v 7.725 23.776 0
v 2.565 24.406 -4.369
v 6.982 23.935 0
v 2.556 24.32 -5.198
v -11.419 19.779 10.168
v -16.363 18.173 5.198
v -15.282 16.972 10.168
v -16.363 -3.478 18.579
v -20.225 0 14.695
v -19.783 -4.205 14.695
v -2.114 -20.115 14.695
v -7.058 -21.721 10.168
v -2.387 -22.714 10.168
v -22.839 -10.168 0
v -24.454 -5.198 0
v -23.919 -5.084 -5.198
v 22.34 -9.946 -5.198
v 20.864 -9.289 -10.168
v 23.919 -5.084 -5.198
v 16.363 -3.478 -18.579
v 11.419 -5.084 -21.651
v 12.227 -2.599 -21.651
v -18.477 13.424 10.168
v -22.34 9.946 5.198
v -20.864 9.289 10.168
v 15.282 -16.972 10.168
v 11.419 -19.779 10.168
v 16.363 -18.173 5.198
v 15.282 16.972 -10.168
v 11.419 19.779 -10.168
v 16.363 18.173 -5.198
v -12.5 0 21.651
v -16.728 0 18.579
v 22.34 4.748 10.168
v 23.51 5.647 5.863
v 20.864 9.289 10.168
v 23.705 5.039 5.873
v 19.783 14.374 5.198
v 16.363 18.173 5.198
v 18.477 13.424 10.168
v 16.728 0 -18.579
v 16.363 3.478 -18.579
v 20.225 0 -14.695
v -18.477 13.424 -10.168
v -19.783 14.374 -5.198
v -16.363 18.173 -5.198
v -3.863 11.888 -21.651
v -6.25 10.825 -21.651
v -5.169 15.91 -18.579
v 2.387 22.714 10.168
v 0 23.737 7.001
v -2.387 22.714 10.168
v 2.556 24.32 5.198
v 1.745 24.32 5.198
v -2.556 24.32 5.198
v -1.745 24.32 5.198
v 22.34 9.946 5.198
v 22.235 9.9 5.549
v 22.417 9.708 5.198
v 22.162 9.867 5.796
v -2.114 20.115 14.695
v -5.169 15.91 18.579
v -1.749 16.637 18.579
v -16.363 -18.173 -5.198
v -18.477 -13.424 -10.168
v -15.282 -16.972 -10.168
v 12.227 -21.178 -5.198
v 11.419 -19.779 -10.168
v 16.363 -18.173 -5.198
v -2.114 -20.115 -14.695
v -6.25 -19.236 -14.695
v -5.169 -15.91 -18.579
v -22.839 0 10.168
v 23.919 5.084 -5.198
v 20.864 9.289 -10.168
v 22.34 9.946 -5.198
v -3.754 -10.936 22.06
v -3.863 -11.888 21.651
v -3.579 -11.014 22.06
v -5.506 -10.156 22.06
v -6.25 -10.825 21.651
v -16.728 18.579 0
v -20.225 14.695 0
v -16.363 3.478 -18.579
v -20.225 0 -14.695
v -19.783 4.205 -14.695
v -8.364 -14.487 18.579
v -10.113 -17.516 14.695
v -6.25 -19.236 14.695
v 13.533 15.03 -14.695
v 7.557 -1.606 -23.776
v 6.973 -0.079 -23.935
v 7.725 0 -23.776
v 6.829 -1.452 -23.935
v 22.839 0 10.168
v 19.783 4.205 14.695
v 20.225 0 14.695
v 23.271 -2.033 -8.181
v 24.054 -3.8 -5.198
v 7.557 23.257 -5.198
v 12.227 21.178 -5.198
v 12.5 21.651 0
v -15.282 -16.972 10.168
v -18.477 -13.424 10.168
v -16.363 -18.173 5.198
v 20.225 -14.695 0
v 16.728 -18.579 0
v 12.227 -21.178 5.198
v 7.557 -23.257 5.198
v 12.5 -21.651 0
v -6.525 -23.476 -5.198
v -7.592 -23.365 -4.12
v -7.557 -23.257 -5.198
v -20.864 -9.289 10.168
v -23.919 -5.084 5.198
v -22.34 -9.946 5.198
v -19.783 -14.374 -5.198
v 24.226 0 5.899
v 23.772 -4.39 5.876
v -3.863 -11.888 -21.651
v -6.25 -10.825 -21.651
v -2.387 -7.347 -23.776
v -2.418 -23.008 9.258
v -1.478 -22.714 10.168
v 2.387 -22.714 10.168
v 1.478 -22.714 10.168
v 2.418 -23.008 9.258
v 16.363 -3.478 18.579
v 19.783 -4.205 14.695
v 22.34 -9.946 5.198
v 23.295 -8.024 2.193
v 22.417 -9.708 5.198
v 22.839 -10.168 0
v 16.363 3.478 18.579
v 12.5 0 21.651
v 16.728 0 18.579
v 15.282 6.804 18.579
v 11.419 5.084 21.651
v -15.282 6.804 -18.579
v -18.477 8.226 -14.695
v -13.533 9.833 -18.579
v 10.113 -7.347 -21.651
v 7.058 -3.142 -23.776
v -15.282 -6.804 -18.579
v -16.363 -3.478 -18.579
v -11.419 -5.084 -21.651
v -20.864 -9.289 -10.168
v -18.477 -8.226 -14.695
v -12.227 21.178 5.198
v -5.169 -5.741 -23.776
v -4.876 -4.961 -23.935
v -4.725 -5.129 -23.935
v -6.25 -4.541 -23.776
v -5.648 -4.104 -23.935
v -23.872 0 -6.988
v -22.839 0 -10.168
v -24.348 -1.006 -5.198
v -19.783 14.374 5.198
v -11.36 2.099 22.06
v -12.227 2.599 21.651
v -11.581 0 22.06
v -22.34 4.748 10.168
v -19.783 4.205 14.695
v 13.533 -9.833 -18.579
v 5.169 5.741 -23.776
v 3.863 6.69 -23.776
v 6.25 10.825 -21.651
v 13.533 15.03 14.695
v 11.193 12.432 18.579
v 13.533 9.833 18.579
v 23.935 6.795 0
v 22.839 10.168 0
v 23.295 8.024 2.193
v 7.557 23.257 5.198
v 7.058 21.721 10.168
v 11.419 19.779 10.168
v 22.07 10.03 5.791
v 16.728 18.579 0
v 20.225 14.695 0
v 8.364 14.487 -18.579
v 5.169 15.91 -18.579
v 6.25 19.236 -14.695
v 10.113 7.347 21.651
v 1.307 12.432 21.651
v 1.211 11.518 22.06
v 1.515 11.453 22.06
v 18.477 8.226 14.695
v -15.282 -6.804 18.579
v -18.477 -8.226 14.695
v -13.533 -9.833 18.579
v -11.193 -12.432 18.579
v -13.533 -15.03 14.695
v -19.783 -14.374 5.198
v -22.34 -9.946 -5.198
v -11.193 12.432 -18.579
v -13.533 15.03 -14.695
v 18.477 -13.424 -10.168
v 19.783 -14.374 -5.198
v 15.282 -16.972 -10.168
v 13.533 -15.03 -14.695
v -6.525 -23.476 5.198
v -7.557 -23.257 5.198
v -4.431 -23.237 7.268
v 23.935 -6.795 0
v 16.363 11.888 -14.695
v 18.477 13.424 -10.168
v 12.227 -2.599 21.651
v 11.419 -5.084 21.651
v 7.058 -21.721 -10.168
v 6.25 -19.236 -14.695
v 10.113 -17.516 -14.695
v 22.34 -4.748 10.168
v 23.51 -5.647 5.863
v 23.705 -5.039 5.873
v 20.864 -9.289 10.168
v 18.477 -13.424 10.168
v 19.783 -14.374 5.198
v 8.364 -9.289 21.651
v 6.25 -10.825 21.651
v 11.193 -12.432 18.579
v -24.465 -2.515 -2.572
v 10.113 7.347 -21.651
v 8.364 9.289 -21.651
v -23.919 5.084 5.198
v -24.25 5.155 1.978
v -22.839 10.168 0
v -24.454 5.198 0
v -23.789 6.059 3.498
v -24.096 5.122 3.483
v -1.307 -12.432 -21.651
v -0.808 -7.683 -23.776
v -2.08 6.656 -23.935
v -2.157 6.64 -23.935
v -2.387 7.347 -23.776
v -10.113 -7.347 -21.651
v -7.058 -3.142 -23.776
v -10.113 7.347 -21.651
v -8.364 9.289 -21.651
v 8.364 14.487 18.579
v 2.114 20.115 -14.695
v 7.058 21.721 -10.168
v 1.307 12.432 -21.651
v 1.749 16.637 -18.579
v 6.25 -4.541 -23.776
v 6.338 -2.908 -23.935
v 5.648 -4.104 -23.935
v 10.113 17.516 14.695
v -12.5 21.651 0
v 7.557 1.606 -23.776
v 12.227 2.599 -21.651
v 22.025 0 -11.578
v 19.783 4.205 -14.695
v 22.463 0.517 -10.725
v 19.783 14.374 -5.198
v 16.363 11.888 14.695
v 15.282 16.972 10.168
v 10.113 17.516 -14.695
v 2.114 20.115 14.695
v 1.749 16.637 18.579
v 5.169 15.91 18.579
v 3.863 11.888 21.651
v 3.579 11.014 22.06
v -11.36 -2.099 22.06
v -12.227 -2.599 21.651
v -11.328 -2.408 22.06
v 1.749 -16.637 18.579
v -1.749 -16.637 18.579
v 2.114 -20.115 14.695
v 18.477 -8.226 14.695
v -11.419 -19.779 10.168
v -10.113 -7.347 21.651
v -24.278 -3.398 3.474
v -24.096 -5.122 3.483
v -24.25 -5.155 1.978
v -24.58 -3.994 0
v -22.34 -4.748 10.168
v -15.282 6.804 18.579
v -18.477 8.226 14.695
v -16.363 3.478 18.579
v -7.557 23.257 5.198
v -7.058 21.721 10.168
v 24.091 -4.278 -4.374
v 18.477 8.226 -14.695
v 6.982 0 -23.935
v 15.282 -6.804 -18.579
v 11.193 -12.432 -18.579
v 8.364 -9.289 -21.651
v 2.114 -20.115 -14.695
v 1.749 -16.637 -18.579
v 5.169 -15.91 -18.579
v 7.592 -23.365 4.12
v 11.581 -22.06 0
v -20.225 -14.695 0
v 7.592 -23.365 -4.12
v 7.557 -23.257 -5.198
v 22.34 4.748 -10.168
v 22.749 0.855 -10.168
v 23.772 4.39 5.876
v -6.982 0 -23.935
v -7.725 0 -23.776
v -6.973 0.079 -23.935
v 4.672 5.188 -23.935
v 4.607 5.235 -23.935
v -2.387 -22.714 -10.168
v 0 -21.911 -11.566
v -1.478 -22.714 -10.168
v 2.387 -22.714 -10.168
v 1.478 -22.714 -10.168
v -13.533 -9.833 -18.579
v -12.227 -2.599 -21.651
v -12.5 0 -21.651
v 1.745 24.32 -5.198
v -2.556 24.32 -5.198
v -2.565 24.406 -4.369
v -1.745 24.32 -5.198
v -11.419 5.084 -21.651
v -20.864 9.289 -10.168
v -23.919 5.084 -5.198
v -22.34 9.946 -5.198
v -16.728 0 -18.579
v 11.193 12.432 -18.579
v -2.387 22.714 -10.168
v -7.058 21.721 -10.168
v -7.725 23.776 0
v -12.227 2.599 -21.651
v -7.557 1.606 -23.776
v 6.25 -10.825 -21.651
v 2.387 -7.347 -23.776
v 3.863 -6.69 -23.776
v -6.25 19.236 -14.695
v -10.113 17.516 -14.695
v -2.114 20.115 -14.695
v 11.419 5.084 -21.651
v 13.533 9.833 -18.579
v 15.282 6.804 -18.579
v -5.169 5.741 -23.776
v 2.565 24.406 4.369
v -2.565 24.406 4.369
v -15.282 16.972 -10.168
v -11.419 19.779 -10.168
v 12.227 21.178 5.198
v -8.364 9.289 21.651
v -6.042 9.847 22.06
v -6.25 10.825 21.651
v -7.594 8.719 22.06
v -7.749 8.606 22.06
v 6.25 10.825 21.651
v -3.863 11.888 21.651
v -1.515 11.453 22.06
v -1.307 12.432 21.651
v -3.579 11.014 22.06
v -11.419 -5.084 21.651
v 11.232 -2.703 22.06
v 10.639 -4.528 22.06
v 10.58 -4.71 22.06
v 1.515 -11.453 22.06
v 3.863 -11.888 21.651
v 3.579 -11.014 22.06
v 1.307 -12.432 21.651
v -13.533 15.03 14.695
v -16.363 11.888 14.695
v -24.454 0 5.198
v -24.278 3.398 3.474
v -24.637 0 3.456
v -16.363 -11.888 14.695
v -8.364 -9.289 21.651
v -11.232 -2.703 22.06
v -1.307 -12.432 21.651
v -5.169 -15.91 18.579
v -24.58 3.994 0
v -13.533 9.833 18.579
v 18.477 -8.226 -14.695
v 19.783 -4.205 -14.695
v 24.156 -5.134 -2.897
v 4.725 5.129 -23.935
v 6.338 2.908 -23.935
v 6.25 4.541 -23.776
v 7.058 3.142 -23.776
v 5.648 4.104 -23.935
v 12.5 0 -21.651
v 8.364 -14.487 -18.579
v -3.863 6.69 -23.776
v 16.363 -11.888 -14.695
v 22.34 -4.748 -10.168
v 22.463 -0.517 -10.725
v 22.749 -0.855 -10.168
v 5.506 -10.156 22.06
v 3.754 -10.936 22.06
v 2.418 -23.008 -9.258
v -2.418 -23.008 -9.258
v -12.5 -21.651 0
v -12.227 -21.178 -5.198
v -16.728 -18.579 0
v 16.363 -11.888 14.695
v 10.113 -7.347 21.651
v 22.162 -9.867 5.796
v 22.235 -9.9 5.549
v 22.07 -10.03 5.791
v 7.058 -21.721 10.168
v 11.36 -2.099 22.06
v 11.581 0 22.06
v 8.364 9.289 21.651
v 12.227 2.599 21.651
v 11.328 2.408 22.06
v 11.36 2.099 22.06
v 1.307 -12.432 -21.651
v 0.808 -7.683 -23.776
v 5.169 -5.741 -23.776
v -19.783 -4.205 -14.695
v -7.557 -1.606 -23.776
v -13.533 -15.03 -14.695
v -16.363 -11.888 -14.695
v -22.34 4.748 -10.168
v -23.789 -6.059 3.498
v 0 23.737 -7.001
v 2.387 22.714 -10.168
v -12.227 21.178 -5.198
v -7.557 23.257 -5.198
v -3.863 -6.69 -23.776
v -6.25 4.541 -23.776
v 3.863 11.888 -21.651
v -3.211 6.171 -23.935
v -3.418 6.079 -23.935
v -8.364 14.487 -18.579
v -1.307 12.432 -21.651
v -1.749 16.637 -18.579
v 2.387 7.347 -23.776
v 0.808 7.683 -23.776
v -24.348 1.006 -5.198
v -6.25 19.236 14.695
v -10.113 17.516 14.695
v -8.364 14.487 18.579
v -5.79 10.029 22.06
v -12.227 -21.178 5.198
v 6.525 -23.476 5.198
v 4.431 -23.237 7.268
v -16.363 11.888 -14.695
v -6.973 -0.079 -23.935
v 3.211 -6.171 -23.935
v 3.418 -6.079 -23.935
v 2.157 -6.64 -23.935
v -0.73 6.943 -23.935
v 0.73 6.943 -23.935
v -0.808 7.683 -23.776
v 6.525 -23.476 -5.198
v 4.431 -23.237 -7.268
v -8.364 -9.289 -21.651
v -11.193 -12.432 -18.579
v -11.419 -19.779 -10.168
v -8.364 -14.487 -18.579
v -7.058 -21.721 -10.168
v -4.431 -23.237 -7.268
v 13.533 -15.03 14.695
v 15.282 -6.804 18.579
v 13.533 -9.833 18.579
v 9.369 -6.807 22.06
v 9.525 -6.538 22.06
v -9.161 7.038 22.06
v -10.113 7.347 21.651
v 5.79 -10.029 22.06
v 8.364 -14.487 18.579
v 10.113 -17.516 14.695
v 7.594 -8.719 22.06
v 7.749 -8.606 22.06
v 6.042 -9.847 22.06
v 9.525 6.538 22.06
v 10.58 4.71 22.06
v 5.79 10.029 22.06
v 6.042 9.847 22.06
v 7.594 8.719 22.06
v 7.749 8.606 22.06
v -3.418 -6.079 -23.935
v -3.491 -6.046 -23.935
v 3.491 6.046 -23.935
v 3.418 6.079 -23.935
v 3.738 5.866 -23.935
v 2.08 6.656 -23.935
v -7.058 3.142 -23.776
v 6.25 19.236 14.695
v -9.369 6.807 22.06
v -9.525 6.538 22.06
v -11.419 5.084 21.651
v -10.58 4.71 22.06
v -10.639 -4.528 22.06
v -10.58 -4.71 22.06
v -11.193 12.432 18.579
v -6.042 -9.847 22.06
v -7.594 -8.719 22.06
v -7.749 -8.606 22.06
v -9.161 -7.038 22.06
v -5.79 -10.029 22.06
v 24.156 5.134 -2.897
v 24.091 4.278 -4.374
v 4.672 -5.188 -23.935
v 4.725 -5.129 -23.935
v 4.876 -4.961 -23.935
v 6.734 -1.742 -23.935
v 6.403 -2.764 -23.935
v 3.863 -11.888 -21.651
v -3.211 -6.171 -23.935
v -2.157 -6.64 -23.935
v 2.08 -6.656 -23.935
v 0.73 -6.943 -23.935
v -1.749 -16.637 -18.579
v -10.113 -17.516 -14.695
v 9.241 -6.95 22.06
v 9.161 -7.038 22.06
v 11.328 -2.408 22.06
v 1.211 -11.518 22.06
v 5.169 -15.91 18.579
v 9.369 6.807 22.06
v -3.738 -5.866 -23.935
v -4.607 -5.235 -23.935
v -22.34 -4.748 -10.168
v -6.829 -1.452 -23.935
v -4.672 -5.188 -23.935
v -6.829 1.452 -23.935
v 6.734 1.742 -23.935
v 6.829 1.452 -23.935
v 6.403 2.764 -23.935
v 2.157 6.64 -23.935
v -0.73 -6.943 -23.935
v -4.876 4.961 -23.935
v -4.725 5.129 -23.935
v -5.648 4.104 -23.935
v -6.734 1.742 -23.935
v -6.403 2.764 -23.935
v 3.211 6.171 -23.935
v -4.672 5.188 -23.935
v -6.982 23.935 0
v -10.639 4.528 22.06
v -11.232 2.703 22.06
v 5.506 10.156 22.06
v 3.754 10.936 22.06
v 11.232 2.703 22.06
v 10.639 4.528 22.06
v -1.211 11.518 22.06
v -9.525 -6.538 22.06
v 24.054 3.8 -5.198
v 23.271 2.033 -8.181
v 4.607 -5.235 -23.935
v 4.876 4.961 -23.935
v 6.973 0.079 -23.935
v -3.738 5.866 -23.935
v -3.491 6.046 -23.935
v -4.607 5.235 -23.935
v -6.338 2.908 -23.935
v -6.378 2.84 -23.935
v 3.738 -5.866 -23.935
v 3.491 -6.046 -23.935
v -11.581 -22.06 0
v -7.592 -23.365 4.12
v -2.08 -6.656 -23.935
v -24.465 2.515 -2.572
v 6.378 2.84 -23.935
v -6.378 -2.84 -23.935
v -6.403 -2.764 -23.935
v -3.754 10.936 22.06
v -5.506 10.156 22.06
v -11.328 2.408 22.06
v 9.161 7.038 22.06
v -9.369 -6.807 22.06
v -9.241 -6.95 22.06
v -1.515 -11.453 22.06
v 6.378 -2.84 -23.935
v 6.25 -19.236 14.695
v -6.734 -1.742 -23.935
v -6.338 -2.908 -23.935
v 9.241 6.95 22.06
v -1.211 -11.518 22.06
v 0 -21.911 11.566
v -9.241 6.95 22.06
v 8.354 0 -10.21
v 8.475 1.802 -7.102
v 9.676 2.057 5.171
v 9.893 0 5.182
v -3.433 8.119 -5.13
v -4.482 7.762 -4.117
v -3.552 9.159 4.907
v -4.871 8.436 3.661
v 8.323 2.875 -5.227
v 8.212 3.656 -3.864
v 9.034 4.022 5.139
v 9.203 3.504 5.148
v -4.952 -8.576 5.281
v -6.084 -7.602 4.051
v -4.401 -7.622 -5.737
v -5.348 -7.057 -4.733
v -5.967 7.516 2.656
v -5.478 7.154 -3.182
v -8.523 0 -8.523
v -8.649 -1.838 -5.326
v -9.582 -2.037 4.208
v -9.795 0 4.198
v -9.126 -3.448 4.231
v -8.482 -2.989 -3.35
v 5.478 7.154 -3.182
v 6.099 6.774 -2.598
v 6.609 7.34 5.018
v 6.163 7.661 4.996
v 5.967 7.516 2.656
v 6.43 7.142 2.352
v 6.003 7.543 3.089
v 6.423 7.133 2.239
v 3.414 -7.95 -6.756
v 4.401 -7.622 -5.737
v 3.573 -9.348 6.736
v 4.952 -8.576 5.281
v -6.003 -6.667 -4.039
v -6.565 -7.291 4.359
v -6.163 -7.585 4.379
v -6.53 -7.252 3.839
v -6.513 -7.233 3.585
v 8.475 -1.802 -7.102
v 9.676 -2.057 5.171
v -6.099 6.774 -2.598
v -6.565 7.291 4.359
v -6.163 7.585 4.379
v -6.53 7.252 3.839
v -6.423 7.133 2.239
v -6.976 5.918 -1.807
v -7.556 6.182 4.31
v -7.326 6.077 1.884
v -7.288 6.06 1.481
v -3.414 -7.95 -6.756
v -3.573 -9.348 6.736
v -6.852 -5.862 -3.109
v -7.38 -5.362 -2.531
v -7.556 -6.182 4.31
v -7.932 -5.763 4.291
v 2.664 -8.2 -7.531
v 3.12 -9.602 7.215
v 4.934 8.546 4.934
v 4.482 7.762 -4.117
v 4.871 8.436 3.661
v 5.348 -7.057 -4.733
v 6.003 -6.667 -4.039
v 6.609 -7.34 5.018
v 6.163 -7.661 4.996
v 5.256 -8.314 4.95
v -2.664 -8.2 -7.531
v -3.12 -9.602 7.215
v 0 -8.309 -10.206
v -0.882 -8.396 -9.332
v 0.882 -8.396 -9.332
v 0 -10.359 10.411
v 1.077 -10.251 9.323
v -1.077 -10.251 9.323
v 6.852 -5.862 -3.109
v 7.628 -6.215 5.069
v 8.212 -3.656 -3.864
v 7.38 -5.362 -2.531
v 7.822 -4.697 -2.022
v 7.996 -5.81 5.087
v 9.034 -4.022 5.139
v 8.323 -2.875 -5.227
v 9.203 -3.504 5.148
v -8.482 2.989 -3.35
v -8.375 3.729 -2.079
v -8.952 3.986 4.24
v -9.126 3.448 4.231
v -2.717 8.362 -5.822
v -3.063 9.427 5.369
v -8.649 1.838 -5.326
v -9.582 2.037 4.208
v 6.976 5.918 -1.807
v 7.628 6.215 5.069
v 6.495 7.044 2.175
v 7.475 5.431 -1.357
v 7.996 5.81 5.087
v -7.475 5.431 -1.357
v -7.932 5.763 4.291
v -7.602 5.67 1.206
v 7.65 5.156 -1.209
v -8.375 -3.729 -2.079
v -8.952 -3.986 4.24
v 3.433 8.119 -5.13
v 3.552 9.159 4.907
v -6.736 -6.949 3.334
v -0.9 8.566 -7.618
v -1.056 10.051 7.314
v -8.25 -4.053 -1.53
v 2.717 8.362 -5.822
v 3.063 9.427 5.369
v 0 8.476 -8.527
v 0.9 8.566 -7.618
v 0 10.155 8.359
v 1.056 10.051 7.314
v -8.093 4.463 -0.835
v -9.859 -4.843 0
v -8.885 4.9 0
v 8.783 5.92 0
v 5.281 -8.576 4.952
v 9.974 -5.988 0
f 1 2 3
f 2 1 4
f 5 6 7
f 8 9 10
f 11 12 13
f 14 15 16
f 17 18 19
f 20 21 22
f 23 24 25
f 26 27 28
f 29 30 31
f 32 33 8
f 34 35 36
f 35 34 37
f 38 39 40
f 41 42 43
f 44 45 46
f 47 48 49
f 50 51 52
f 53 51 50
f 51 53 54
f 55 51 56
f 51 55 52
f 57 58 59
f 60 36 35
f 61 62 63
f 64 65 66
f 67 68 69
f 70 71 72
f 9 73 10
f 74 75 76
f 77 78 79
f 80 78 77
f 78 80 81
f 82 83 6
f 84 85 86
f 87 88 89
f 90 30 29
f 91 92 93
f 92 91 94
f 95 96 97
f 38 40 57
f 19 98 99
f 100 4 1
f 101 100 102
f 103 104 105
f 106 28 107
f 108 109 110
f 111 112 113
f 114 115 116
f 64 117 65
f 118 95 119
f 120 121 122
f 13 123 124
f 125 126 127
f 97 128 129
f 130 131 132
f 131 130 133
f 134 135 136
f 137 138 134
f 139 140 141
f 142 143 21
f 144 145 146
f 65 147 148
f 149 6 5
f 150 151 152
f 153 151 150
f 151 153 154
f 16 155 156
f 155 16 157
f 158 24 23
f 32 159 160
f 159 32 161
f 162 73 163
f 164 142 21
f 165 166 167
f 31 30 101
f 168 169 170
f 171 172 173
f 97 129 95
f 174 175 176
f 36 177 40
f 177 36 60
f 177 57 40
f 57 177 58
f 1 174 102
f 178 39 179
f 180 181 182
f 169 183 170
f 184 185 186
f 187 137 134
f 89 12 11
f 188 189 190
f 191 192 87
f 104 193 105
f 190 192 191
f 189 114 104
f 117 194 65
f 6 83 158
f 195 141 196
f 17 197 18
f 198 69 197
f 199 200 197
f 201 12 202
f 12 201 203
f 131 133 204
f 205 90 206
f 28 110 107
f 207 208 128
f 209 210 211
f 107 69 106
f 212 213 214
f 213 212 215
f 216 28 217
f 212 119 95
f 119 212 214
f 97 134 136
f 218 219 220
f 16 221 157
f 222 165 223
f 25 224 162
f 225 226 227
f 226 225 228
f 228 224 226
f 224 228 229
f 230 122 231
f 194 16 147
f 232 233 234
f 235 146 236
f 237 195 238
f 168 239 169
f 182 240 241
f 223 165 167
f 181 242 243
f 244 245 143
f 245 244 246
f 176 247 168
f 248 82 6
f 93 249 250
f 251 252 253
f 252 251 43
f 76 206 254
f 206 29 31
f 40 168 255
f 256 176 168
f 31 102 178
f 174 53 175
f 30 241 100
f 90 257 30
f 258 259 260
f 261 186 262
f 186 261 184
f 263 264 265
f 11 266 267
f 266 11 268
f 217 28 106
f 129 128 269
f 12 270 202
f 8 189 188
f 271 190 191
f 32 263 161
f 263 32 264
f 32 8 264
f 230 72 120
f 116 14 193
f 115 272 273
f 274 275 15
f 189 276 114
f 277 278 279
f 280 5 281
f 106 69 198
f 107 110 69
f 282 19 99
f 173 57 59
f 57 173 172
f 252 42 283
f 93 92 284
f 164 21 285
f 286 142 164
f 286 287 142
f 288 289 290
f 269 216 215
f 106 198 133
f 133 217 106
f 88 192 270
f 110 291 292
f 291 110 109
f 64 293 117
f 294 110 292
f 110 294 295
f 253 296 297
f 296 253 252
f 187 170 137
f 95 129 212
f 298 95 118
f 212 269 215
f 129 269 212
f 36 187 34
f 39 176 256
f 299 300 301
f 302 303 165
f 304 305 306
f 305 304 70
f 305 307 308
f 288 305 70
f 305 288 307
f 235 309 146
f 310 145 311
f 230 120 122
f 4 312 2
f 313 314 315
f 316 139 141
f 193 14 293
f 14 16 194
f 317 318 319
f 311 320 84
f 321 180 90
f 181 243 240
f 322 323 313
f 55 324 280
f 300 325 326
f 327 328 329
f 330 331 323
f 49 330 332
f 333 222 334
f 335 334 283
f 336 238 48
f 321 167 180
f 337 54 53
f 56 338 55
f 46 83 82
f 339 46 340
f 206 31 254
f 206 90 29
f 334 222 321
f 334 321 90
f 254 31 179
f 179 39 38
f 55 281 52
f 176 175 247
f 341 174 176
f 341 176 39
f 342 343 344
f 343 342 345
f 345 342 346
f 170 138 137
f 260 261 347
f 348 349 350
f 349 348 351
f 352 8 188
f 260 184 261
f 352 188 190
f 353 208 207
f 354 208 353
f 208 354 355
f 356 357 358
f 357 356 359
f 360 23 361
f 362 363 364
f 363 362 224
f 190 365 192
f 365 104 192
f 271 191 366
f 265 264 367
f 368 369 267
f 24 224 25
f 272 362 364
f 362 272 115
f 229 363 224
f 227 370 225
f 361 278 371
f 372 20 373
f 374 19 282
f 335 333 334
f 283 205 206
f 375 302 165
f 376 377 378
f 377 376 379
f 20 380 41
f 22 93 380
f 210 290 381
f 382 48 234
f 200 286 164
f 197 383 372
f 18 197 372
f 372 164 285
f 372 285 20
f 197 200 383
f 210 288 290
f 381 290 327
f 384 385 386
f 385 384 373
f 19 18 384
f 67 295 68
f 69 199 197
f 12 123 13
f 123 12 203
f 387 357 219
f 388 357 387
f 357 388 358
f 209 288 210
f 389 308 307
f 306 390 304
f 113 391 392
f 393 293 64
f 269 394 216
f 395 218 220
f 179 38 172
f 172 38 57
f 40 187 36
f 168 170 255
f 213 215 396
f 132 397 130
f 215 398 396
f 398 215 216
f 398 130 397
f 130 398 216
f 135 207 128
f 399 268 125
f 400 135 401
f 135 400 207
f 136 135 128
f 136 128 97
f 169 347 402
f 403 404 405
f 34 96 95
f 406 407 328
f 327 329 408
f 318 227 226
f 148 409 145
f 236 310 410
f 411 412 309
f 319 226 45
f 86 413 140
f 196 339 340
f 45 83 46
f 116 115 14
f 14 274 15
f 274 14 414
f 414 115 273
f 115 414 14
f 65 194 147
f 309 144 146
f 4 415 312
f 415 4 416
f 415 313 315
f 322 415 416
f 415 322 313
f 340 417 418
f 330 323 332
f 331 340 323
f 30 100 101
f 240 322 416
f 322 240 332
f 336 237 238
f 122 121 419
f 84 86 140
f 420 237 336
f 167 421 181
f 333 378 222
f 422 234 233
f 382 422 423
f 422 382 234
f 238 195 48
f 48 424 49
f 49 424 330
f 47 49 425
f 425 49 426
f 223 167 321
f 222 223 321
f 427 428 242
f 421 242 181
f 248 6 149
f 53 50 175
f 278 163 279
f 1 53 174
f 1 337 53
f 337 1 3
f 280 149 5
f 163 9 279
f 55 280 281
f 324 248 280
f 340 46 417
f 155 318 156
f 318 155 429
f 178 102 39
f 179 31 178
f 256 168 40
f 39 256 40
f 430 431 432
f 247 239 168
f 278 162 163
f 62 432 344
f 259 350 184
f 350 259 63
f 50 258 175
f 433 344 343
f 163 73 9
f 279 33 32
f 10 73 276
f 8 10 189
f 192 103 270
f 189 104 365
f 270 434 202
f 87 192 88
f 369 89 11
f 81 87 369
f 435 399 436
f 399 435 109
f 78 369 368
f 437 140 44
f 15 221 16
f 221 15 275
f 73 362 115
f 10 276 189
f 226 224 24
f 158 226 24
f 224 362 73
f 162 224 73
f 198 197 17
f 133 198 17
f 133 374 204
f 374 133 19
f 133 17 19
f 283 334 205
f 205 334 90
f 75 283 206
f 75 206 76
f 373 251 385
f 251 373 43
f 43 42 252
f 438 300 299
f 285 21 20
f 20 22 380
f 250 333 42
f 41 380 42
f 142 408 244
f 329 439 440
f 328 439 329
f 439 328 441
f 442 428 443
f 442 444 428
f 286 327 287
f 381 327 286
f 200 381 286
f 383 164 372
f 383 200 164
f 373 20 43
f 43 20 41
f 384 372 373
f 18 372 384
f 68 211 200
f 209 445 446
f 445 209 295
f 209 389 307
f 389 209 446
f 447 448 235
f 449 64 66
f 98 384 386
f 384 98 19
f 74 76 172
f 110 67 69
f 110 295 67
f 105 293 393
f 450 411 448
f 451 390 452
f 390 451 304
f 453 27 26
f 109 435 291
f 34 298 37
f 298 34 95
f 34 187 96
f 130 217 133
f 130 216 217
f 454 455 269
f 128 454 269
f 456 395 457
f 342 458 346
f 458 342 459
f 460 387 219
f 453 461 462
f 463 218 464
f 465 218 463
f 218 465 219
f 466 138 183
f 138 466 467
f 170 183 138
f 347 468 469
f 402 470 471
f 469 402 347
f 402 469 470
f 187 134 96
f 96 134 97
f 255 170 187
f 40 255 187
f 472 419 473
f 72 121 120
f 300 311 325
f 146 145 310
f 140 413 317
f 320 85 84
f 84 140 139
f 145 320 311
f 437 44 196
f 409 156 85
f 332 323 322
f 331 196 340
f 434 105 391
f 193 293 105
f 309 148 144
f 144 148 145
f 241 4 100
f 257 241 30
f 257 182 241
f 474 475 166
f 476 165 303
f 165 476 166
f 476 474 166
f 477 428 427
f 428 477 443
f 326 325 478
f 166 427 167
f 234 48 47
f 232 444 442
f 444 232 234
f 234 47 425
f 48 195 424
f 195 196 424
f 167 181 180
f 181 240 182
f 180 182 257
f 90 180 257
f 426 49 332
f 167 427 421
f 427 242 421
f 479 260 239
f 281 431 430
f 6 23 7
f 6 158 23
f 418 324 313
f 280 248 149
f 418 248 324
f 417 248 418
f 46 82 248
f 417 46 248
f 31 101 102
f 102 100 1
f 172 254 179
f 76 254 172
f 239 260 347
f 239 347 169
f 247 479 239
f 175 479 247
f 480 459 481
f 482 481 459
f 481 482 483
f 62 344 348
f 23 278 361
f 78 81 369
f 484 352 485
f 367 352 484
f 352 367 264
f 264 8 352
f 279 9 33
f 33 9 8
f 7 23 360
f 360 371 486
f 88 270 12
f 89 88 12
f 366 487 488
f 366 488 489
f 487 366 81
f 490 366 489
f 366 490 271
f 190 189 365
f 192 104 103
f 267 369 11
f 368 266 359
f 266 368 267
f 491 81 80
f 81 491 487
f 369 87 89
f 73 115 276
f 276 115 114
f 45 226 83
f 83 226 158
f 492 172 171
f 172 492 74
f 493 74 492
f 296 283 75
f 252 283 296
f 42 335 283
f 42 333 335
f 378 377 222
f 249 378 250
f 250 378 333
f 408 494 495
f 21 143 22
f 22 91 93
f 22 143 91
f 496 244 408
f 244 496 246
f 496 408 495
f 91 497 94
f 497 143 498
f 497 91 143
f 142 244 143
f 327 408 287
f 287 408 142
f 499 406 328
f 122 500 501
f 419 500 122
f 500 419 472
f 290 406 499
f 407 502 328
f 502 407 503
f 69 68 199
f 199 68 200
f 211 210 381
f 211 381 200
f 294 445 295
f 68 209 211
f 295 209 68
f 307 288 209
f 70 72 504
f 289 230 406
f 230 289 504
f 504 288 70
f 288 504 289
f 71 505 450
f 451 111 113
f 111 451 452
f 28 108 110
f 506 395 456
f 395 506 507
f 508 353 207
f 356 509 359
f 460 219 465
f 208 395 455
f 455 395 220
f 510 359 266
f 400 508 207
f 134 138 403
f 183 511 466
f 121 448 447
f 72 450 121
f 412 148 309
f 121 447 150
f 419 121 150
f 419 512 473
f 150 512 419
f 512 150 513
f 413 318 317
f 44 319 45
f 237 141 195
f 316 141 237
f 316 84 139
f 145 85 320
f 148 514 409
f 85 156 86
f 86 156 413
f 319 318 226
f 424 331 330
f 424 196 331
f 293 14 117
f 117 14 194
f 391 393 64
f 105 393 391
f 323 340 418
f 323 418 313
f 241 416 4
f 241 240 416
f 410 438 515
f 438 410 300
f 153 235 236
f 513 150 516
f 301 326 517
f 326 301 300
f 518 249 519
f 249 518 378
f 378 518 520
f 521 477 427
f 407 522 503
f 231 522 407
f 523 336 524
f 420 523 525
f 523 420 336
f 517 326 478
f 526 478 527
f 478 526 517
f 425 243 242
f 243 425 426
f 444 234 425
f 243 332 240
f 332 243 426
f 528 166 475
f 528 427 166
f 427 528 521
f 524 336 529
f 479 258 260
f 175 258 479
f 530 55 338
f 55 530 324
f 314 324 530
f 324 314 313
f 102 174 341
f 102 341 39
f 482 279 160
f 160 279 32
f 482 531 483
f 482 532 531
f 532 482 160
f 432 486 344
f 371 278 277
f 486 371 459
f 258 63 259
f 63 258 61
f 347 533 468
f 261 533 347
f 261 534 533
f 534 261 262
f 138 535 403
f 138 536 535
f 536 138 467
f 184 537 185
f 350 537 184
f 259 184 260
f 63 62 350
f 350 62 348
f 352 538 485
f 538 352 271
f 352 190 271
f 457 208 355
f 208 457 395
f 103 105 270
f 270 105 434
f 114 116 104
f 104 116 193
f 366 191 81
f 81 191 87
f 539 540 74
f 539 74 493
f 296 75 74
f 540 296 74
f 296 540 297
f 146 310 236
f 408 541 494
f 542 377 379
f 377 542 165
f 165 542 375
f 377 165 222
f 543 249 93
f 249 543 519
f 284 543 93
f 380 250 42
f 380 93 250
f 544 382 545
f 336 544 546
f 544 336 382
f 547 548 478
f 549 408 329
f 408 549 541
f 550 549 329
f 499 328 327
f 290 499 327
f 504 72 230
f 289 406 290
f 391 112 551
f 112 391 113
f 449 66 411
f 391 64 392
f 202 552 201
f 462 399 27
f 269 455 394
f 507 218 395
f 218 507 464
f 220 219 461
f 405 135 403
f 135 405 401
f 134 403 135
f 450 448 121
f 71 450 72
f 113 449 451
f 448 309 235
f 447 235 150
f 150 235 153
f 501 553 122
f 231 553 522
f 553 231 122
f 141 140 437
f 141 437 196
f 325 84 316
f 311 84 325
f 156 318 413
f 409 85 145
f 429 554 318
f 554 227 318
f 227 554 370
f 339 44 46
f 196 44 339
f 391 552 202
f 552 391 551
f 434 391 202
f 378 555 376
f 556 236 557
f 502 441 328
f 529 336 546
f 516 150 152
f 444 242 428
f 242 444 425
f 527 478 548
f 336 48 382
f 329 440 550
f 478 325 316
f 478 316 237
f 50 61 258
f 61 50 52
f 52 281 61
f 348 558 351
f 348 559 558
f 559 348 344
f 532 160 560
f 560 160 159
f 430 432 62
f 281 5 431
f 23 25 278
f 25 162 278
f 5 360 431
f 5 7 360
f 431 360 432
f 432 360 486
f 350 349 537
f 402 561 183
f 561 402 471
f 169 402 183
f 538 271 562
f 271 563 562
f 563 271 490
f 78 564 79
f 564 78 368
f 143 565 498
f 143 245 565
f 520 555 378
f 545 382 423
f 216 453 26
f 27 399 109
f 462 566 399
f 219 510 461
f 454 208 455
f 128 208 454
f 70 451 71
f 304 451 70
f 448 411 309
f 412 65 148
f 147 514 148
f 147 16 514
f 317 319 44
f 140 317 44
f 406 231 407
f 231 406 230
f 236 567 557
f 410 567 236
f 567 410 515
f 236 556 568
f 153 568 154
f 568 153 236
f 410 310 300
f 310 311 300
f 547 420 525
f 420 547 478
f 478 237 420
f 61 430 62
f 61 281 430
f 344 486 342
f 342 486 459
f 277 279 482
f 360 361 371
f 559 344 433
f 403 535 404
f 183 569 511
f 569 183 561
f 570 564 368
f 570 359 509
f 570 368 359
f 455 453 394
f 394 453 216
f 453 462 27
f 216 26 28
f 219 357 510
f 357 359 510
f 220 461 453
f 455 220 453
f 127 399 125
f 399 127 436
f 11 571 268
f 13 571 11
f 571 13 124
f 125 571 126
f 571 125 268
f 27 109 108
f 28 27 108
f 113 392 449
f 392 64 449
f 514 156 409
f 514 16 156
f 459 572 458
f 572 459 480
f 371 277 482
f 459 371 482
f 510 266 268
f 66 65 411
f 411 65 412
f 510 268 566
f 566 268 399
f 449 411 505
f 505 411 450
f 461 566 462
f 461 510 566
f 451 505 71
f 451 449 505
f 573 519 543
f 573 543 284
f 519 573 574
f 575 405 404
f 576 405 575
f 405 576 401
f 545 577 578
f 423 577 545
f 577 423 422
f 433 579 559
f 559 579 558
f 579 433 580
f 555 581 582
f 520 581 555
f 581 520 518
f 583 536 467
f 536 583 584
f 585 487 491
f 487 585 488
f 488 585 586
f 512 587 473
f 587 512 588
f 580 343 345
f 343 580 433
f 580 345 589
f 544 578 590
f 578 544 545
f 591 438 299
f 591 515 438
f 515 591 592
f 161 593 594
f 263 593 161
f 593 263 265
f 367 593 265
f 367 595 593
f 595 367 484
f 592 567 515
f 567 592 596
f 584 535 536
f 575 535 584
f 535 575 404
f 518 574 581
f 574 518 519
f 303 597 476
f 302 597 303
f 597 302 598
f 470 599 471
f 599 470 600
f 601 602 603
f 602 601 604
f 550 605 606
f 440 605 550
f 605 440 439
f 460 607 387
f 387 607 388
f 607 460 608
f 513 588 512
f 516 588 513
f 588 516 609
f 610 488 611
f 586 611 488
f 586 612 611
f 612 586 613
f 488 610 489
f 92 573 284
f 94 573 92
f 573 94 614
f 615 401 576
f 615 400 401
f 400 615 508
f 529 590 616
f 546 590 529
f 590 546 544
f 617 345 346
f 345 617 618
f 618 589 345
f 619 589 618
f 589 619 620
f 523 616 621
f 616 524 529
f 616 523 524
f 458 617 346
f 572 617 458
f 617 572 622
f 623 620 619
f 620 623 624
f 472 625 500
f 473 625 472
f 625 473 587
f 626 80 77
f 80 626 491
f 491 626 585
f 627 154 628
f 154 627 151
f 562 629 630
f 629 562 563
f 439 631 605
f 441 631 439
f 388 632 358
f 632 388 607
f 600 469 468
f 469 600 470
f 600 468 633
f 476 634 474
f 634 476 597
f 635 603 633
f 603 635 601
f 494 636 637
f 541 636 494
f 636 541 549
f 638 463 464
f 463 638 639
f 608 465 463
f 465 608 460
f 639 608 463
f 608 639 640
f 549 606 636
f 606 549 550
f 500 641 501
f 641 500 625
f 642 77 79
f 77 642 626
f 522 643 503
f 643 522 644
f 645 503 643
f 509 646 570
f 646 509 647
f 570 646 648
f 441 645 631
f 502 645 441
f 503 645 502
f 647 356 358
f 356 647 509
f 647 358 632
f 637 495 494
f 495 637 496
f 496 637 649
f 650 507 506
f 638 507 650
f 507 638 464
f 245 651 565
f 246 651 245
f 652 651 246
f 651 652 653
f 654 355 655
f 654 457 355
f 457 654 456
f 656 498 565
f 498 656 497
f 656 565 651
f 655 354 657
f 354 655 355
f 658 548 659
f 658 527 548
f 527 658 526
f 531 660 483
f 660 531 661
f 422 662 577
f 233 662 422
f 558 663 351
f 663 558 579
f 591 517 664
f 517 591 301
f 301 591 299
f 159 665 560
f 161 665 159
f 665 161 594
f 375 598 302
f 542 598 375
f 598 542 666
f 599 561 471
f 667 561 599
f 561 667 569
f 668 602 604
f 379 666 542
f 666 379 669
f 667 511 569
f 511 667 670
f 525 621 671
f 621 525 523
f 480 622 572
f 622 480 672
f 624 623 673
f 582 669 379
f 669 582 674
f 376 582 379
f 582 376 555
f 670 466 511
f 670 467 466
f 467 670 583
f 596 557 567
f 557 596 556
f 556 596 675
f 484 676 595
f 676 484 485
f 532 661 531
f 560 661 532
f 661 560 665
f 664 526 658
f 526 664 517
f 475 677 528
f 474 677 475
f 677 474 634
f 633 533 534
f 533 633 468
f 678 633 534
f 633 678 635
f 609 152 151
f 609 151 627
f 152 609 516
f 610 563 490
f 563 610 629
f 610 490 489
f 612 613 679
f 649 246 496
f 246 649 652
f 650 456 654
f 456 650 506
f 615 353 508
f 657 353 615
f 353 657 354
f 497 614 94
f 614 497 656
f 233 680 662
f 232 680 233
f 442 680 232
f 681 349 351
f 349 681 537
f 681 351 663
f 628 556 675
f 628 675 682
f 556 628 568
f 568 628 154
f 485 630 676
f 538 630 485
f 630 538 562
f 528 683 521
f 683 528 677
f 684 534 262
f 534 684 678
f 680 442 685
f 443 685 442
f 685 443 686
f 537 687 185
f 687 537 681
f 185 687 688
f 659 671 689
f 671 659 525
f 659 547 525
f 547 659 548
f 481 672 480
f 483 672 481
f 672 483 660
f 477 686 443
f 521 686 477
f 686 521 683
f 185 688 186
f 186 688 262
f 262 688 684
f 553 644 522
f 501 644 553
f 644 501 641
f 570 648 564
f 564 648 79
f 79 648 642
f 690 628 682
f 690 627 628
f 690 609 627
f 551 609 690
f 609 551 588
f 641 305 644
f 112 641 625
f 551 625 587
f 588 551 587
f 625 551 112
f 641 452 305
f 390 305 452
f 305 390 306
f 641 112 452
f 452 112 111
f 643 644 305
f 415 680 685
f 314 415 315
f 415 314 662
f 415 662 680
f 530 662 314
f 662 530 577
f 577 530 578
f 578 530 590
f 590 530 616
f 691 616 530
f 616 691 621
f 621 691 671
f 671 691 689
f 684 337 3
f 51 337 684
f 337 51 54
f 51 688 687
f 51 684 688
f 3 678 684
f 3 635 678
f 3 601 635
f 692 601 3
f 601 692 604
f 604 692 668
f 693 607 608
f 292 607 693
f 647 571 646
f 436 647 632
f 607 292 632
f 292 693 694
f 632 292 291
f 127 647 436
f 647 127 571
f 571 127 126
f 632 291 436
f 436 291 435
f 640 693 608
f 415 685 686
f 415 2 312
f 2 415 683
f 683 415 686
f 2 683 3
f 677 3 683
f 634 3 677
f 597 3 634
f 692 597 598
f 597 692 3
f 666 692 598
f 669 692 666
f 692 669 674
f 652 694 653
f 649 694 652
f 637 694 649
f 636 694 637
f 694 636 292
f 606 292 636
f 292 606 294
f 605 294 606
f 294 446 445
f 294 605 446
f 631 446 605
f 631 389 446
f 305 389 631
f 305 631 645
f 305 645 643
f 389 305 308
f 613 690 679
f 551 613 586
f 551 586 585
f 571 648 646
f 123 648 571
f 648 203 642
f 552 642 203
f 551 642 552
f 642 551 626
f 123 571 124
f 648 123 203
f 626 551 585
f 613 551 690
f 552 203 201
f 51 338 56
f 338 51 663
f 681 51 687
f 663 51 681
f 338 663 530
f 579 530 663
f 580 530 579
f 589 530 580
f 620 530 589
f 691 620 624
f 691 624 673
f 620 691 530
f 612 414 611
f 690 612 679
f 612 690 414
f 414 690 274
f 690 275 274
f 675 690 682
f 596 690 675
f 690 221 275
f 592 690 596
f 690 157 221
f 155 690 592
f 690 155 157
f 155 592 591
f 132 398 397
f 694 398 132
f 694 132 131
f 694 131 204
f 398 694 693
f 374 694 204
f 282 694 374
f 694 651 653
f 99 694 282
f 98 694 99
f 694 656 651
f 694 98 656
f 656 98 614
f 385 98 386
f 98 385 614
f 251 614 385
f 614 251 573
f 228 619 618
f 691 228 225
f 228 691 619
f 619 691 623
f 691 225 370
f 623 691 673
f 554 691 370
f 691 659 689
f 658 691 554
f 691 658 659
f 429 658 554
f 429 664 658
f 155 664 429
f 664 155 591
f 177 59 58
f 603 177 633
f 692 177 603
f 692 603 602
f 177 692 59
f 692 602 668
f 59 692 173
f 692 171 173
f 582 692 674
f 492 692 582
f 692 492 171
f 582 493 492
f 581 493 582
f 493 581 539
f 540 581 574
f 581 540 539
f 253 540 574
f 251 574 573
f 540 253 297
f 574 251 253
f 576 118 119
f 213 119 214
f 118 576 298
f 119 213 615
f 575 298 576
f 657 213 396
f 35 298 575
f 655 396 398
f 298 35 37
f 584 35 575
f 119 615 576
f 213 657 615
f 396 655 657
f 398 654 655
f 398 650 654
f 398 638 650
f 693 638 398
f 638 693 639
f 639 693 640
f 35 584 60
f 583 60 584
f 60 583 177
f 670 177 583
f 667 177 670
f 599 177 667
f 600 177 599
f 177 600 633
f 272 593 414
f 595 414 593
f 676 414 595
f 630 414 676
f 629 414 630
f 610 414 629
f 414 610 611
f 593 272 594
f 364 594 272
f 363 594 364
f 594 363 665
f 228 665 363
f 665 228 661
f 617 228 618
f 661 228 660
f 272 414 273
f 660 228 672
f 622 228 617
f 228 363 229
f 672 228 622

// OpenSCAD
// copy of example001 used for camera tests

module example001()
{
	function r_from_dia(d) = d / 2;

	module rotcy(rot, r, h) {
		rotate(90, rot)
			cylinder(r1 = r / 2, r2 = r, h = h, center = true);
	}

	difference() {
		sphere(r = r_from_dia(size));
		rotcy([0, 0, 0], cy_r, cy_h);
		rotcy([1, 0, 0], cy_r, cy_h, $fn = 4);
		rotcy([0, 1, 0], cy_r, cy_h, $fn = 3);
	}

	size = 50;
	hole = 25;

	cy_r = r_from_dia(hole);
	cy_h = r_from_dia(size * 2.5);
}

$vpt = [5.0, 5.0, 5.0];
$vpr = [10.0, 20,0, 30.0];
$vpd = 200.0;

example001();
